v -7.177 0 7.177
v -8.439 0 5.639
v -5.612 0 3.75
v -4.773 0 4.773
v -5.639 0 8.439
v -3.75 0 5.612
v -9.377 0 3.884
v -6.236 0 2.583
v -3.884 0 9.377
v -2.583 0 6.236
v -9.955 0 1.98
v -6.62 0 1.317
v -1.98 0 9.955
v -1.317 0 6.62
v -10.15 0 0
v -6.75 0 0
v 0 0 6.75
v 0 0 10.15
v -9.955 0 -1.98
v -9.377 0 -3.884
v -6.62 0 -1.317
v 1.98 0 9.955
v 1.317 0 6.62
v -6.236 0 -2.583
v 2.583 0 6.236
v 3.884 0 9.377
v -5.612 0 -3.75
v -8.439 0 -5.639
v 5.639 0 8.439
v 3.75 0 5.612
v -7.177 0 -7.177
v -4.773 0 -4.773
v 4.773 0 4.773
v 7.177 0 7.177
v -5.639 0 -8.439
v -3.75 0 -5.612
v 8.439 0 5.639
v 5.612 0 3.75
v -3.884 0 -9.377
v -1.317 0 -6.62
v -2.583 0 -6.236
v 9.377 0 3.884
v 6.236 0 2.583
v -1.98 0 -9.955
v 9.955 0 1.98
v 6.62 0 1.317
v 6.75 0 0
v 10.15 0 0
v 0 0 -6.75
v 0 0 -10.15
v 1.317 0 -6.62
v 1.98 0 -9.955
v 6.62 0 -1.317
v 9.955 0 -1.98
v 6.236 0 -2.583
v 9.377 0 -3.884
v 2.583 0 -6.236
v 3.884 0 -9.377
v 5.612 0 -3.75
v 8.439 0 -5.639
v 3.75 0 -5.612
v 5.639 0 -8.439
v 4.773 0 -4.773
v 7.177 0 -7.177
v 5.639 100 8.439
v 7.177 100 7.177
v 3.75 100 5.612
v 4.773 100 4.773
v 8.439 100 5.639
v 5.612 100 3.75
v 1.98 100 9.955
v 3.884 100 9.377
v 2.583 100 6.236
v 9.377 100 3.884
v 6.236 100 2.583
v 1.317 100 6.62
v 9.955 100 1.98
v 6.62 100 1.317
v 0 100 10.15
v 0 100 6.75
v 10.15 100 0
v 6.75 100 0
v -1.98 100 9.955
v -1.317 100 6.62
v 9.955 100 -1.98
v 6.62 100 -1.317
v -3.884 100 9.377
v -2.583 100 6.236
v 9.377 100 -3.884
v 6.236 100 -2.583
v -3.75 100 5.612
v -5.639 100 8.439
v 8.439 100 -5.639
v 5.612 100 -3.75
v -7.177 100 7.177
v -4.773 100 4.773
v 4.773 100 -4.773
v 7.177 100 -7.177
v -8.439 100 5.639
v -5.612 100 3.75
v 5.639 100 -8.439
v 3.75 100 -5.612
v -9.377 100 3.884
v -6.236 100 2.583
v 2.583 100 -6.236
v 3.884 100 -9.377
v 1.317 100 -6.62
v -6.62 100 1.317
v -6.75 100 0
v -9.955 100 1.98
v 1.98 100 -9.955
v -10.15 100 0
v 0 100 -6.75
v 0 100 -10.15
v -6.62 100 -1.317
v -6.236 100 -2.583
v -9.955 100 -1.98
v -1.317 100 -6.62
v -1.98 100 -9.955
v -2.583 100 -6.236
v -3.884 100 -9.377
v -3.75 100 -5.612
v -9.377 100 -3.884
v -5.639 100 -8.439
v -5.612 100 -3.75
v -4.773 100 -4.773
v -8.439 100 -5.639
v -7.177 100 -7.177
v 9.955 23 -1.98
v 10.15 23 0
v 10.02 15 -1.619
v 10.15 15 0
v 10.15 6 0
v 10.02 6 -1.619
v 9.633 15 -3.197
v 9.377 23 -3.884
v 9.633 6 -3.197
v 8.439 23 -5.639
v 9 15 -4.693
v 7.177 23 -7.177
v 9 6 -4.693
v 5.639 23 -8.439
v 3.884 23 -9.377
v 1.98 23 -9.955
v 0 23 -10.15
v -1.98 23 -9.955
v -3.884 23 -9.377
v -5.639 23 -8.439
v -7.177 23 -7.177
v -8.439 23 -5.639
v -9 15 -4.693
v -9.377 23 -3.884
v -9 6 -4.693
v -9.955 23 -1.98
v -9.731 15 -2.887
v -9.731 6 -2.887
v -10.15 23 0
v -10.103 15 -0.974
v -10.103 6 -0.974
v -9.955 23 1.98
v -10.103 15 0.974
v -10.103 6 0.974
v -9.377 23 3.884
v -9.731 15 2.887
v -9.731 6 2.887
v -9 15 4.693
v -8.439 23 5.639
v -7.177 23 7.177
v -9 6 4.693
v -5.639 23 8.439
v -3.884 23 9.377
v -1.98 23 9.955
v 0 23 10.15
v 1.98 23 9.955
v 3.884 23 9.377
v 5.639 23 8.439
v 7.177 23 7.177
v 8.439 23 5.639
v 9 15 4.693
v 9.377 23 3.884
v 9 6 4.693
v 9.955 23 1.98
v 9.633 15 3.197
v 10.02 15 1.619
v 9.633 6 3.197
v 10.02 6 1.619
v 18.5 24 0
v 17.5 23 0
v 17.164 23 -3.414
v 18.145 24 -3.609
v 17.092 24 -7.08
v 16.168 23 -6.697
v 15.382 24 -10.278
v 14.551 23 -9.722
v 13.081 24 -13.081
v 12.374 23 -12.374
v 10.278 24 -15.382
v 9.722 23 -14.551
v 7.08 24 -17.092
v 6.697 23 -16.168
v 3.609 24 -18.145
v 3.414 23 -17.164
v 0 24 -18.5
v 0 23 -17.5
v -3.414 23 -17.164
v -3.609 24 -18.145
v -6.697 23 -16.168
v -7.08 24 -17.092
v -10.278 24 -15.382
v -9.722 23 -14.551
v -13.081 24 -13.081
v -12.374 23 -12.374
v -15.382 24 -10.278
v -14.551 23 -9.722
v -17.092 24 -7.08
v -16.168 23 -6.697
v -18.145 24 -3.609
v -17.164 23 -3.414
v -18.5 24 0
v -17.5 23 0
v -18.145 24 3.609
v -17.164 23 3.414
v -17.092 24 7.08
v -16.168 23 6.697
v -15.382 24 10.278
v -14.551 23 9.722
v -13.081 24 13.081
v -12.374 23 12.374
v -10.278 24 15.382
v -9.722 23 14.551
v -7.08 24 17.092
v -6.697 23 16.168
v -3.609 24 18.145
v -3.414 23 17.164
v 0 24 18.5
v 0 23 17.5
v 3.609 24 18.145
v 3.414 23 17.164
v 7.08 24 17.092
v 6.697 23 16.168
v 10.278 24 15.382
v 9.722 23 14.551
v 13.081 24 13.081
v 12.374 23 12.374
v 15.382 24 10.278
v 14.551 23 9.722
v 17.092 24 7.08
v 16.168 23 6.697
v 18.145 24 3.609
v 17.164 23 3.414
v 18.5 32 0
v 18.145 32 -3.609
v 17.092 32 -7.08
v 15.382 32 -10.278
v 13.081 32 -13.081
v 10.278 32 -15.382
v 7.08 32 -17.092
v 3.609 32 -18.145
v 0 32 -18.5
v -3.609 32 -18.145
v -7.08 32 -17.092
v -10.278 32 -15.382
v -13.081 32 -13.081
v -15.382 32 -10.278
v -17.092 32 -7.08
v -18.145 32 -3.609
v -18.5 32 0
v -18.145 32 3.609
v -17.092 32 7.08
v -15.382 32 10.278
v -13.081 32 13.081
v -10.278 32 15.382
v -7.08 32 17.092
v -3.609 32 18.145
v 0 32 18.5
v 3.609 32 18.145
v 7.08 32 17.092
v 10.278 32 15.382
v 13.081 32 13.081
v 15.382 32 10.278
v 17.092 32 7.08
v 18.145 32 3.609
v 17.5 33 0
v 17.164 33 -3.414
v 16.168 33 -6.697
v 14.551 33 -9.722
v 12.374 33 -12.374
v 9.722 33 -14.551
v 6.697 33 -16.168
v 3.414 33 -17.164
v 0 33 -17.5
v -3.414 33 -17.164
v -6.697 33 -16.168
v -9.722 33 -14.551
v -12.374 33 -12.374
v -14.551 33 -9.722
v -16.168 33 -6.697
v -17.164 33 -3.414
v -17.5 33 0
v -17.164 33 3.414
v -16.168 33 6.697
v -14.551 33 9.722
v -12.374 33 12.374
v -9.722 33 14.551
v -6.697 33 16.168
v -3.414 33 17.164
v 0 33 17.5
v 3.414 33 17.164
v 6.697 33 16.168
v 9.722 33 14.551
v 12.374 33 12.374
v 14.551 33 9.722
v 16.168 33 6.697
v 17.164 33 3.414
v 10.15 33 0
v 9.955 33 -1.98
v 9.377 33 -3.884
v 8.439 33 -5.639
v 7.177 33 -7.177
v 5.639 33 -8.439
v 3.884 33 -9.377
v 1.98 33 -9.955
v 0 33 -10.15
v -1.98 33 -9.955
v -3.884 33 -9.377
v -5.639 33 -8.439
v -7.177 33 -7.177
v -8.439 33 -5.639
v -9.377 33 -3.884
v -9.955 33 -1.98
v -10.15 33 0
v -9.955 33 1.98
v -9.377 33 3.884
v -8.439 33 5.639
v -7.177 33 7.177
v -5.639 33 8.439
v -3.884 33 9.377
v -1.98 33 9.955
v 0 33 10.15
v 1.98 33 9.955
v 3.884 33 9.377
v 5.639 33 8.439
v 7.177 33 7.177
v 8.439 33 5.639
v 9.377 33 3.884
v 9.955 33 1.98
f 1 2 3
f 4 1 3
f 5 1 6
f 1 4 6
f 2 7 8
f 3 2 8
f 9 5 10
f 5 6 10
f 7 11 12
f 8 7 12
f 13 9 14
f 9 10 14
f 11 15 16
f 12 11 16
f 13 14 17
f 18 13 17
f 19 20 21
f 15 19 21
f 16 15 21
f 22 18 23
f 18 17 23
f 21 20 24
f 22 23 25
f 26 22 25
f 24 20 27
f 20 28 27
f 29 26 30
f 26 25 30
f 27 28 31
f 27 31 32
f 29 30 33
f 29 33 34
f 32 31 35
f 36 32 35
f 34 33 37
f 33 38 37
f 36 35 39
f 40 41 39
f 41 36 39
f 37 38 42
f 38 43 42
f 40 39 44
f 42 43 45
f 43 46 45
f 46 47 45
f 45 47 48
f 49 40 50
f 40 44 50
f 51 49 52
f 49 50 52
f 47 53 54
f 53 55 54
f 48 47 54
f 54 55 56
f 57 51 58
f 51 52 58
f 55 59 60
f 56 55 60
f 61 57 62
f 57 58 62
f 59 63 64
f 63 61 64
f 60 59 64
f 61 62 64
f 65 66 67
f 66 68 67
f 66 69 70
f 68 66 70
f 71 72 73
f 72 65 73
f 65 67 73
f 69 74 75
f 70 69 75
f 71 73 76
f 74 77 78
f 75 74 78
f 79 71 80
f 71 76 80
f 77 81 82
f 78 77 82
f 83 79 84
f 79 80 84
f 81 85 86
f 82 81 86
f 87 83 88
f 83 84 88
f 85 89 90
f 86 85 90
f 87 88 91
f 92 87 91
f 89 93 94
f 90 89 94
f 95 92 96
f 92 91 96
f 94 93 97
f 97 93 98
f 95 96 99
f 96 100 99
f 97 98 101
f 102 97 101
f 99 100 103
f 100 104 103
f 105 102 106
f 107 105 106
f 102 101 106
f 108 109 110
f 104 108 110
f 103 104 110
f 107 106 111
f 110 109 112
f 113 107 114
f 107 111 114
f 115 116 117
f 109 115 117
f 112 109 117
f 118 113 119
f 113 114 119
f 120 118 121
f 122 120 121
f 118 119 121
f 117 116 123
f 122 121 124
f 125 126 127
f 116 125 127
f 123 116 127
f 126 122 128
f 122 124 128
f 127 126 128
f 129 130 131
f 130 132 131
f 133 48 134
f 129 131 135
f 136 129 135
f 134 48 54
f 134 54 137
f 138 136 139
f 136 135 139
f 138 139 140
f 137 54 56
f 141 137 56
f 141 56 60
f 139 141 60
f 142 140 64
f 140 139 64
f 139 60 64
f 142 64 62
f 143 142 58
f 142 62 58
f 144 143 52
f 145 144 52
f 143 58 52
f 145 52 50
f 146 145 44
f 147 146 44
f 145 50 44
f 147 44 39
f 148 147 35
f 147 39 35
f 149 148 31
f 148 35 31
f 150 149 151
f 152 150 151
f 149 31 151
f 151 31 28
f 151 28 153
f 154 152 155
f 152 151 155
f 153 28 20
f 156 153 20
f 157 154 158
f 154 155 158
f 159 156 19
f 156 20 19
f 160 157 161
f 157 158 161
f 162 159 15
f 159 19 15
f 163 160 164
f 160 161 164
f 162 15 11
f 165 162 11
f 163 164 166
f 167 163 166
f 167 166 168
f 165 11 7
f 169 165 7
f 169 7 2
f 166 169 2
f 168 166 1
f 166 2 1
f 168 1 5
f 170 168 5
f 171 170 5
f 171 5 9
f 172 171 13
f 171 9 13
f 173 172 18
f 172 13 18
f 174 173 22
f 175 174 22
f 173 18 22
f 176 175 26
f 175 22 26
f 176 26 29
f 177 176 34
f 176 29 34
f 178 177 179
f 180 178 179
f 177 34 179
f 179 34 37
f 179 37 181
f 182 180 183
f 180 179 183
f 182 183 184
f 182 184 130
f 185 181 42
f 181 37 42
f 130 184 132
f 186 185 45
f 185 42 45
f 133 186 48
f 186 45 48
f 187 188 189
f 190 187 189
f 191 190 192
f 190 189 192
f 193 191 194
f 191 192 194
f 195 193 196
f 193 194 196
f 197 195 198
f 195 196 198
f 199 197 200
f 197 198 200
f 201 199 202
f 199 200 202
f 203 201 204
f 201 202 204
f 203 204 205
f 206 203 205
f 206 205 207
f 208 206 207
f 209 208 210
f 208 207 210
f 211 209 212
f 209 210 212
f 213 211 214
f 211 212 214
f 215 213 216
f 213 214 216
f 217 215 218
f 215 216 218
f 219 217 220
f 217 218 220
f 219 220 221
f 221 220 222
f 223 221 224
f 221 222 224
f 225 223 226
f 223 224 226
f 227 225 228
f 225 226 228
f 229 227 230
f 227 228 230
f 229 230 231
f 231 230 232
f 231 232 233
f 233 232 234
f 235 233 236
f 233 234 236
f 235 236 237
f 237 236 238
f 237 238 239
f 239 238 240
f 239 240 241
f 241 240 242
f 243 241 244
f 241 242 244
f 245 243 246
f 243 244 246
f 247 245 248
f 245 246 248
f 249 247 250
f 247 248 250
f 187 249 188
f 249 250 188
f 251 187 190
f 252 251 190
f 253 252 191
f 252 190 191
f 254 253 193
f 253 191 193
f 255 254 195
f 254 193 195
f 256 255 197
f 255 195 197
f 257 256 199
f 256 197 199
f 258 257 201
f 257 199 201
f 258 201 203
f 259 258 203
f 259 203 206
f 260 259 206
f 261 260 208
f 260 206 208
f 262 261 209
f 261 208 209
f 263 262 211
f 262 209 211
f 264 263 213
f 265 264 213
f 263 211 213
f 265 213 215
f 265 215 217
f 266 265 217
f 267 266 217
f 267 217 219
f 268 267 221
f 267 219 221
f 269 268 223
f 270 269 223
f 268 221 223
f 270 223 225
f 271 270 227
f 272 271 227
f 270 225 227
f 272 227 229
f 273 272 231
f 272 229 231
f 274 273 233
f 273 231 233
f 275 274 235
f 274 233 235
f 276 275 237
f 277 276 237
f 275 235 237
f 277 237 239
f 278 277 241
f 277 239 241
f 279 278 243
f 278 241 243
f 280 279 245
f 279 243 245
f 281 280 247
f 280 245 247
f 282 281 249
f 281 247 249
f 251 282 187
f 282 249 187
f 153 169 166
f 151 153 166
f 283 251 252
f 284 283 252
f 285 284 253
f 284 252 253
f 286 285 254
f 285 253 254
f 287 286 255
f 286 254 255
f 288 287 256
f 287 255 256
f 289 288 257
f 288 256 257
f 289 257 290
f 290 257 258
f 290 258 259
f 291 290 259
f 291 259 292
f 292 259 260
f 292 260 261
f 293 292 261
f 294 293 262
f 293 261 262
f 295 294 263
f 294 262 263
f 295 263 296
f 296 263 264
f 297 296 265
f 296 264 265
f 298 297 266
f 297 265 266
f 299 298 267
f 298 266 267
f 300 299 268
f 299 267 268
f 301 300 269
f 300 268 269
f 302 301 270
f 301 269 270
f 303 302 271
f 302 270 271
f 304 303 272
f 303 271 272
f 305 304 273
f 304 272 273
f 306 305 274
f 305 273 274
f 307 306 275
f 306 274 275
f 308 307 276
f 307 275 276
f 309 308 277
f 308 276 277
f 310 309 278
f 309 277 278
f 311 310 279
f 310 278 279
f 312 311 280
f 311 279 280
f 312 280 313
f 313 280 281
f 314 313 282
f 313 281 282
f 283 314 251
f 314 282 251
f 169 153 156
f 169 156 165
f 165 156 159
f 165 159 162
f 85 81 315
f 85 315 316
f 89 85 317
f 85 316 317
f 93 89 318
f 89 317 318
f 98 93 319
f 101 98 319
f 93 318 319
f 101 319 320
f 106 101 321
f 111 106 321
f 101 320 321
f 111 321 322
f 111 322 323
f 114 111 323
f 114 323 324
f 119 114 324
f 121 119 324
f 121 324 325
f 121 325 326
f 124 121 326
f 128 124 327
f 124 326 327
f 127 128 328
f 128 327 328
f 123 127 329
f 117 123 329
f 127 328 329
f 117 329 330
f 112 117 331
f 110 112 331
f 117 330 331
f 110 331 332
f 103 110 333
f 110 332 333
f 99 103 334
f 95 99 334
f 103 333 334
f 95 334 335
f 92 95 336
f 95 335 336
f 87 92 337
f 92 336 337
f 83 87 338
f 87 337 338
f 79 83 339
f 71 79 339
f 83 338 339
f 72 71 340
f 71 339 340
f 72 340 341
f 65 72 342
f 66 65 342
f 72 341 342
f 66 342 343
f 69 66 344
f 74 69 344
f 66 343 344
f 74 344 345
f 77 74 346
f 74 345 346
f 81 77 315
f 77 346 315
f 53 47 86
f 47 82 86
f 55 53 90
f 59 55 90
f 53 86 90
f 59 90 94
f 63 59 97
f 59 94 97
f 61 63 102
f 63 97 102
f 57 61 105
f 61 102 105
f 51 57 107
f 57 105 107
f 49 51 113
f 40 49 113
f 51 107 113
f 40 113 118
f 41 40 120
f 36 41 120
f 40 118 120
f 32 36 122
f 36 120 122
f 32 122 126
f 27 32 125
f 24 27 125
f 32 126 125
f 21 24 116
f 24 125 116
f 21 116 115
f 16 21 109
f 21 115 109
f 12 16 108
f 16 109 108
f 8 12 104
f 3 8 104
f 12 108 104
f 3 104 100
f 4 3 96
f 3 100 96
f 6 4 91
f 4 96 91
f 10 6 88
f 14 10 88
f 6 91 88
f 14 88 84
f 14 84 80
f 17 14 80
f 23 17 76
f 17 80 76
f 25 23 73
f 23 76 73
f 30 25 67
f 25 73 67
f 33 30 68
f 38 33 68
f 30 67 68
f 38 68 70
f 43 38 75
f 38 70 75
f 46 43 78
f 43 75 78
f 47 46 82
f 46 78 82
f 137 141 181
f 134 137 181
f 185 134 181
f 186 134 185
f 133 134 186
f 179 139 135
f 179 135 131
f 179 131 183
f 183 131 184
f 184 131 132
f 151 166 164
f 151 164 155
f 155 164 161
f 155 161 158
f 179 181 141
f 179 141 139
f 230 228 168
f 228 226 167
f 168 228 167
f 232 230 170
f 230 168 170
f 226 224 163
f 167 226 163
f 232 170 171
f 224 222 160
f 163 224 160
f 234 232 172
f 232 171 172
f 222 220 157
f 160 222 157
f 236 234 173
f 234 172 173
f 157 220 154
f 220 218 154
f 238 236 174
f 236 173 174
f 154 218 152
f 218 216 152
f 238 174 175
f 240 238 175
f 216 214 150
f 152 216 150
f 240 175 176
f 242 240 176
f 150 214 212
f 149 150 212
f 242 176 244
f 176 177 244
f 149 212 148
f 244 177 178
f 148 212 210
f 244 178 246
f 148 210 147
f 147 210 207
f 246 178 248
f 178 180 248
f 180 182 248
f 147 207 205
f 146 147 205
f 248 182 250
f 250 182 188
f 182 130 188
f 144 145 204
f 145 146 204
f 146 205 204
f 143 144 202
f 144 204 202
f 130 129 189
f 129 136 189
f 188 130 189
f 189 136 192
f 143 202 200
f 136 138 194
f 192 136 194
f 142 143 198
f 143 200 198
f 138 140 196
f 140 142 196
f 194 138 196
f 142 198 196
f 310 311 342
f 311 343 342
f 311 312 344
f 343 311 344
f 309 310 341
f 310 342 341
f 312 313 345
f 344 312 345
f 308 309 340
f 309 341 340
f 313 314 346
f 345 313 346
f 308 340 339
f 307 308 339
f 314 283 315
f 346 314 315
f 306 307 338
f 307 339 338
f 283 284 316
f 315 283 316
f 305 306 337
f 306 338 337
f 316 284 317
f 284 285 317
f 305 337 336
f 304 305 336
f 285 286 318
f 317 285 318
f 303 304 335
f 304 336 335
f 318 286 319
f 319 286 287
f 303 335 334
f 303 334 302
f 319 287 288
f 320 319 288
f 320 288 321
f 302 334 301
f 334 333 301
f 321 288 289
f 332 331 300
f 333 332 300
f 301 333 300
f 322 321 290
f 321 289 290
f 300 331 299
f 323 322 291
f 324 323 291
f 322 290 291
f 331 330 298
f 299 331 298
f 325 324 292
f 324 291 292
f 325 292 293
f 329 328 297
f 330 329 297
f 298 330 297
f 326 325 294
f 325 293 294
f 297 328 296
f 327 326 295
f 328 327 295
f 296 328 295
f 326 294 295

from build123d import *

# Parameters (mm, degrees)
SKETCH2_W               = 3
SKETCH2_H               = 9
CUT_EXTRUDE1_DEPTH      = 19.5
CUT_EXTRUDE1_DEPTH_BACK = 19.5
CHAMFER1_SIZE           = 1


with BuildPart() as part:
    # Sketch1 → Revolve1 (revolve)
    with BuildSketch(Plane.XY):
        Polygon((10.15, 100), (10.15, 33), (18.5, 33), (18.5, 23), (10.15, 23), (10.15, 0), (6.75, 0), (6.75, 100), align=None)
    revolve(axis=Axis((0, -728.004511314, 0), (0, 1, 0)))

    # Sketch2 → Cut-Extrude1 (cut, two sides)
    with BuildSketch(Plane.XY) as cut_extrude1_sk:
        with Locations((10.5, 10.5)):
            Rectangle(SKETCH2_W, SKETCH2_H)
        with Locations((-10.5, 10.5)):
            Rectangle(SKETCH2_W, SKETCH2_H)
    extrude(amount=CUT_EXTRUDE1_DEPTH, mode=Mode.SUBTRACT)
    extrude(cut_extrude1_sk.sketch, amount=-CUT_EXTRUDE1_DEPTH_BACK, mode=Mode.SUBTRACT)

    # Chamfer1
    chamfer1_edges = [part.edges().sort_by_distance(p)[0] for p in [
        (-18.5, 23, 0),
        (-18.5, 33, 0),
    ]]
    chamfer(chamfer1_edges, length=CHAMFER1_SIZE)


solid = part.part
